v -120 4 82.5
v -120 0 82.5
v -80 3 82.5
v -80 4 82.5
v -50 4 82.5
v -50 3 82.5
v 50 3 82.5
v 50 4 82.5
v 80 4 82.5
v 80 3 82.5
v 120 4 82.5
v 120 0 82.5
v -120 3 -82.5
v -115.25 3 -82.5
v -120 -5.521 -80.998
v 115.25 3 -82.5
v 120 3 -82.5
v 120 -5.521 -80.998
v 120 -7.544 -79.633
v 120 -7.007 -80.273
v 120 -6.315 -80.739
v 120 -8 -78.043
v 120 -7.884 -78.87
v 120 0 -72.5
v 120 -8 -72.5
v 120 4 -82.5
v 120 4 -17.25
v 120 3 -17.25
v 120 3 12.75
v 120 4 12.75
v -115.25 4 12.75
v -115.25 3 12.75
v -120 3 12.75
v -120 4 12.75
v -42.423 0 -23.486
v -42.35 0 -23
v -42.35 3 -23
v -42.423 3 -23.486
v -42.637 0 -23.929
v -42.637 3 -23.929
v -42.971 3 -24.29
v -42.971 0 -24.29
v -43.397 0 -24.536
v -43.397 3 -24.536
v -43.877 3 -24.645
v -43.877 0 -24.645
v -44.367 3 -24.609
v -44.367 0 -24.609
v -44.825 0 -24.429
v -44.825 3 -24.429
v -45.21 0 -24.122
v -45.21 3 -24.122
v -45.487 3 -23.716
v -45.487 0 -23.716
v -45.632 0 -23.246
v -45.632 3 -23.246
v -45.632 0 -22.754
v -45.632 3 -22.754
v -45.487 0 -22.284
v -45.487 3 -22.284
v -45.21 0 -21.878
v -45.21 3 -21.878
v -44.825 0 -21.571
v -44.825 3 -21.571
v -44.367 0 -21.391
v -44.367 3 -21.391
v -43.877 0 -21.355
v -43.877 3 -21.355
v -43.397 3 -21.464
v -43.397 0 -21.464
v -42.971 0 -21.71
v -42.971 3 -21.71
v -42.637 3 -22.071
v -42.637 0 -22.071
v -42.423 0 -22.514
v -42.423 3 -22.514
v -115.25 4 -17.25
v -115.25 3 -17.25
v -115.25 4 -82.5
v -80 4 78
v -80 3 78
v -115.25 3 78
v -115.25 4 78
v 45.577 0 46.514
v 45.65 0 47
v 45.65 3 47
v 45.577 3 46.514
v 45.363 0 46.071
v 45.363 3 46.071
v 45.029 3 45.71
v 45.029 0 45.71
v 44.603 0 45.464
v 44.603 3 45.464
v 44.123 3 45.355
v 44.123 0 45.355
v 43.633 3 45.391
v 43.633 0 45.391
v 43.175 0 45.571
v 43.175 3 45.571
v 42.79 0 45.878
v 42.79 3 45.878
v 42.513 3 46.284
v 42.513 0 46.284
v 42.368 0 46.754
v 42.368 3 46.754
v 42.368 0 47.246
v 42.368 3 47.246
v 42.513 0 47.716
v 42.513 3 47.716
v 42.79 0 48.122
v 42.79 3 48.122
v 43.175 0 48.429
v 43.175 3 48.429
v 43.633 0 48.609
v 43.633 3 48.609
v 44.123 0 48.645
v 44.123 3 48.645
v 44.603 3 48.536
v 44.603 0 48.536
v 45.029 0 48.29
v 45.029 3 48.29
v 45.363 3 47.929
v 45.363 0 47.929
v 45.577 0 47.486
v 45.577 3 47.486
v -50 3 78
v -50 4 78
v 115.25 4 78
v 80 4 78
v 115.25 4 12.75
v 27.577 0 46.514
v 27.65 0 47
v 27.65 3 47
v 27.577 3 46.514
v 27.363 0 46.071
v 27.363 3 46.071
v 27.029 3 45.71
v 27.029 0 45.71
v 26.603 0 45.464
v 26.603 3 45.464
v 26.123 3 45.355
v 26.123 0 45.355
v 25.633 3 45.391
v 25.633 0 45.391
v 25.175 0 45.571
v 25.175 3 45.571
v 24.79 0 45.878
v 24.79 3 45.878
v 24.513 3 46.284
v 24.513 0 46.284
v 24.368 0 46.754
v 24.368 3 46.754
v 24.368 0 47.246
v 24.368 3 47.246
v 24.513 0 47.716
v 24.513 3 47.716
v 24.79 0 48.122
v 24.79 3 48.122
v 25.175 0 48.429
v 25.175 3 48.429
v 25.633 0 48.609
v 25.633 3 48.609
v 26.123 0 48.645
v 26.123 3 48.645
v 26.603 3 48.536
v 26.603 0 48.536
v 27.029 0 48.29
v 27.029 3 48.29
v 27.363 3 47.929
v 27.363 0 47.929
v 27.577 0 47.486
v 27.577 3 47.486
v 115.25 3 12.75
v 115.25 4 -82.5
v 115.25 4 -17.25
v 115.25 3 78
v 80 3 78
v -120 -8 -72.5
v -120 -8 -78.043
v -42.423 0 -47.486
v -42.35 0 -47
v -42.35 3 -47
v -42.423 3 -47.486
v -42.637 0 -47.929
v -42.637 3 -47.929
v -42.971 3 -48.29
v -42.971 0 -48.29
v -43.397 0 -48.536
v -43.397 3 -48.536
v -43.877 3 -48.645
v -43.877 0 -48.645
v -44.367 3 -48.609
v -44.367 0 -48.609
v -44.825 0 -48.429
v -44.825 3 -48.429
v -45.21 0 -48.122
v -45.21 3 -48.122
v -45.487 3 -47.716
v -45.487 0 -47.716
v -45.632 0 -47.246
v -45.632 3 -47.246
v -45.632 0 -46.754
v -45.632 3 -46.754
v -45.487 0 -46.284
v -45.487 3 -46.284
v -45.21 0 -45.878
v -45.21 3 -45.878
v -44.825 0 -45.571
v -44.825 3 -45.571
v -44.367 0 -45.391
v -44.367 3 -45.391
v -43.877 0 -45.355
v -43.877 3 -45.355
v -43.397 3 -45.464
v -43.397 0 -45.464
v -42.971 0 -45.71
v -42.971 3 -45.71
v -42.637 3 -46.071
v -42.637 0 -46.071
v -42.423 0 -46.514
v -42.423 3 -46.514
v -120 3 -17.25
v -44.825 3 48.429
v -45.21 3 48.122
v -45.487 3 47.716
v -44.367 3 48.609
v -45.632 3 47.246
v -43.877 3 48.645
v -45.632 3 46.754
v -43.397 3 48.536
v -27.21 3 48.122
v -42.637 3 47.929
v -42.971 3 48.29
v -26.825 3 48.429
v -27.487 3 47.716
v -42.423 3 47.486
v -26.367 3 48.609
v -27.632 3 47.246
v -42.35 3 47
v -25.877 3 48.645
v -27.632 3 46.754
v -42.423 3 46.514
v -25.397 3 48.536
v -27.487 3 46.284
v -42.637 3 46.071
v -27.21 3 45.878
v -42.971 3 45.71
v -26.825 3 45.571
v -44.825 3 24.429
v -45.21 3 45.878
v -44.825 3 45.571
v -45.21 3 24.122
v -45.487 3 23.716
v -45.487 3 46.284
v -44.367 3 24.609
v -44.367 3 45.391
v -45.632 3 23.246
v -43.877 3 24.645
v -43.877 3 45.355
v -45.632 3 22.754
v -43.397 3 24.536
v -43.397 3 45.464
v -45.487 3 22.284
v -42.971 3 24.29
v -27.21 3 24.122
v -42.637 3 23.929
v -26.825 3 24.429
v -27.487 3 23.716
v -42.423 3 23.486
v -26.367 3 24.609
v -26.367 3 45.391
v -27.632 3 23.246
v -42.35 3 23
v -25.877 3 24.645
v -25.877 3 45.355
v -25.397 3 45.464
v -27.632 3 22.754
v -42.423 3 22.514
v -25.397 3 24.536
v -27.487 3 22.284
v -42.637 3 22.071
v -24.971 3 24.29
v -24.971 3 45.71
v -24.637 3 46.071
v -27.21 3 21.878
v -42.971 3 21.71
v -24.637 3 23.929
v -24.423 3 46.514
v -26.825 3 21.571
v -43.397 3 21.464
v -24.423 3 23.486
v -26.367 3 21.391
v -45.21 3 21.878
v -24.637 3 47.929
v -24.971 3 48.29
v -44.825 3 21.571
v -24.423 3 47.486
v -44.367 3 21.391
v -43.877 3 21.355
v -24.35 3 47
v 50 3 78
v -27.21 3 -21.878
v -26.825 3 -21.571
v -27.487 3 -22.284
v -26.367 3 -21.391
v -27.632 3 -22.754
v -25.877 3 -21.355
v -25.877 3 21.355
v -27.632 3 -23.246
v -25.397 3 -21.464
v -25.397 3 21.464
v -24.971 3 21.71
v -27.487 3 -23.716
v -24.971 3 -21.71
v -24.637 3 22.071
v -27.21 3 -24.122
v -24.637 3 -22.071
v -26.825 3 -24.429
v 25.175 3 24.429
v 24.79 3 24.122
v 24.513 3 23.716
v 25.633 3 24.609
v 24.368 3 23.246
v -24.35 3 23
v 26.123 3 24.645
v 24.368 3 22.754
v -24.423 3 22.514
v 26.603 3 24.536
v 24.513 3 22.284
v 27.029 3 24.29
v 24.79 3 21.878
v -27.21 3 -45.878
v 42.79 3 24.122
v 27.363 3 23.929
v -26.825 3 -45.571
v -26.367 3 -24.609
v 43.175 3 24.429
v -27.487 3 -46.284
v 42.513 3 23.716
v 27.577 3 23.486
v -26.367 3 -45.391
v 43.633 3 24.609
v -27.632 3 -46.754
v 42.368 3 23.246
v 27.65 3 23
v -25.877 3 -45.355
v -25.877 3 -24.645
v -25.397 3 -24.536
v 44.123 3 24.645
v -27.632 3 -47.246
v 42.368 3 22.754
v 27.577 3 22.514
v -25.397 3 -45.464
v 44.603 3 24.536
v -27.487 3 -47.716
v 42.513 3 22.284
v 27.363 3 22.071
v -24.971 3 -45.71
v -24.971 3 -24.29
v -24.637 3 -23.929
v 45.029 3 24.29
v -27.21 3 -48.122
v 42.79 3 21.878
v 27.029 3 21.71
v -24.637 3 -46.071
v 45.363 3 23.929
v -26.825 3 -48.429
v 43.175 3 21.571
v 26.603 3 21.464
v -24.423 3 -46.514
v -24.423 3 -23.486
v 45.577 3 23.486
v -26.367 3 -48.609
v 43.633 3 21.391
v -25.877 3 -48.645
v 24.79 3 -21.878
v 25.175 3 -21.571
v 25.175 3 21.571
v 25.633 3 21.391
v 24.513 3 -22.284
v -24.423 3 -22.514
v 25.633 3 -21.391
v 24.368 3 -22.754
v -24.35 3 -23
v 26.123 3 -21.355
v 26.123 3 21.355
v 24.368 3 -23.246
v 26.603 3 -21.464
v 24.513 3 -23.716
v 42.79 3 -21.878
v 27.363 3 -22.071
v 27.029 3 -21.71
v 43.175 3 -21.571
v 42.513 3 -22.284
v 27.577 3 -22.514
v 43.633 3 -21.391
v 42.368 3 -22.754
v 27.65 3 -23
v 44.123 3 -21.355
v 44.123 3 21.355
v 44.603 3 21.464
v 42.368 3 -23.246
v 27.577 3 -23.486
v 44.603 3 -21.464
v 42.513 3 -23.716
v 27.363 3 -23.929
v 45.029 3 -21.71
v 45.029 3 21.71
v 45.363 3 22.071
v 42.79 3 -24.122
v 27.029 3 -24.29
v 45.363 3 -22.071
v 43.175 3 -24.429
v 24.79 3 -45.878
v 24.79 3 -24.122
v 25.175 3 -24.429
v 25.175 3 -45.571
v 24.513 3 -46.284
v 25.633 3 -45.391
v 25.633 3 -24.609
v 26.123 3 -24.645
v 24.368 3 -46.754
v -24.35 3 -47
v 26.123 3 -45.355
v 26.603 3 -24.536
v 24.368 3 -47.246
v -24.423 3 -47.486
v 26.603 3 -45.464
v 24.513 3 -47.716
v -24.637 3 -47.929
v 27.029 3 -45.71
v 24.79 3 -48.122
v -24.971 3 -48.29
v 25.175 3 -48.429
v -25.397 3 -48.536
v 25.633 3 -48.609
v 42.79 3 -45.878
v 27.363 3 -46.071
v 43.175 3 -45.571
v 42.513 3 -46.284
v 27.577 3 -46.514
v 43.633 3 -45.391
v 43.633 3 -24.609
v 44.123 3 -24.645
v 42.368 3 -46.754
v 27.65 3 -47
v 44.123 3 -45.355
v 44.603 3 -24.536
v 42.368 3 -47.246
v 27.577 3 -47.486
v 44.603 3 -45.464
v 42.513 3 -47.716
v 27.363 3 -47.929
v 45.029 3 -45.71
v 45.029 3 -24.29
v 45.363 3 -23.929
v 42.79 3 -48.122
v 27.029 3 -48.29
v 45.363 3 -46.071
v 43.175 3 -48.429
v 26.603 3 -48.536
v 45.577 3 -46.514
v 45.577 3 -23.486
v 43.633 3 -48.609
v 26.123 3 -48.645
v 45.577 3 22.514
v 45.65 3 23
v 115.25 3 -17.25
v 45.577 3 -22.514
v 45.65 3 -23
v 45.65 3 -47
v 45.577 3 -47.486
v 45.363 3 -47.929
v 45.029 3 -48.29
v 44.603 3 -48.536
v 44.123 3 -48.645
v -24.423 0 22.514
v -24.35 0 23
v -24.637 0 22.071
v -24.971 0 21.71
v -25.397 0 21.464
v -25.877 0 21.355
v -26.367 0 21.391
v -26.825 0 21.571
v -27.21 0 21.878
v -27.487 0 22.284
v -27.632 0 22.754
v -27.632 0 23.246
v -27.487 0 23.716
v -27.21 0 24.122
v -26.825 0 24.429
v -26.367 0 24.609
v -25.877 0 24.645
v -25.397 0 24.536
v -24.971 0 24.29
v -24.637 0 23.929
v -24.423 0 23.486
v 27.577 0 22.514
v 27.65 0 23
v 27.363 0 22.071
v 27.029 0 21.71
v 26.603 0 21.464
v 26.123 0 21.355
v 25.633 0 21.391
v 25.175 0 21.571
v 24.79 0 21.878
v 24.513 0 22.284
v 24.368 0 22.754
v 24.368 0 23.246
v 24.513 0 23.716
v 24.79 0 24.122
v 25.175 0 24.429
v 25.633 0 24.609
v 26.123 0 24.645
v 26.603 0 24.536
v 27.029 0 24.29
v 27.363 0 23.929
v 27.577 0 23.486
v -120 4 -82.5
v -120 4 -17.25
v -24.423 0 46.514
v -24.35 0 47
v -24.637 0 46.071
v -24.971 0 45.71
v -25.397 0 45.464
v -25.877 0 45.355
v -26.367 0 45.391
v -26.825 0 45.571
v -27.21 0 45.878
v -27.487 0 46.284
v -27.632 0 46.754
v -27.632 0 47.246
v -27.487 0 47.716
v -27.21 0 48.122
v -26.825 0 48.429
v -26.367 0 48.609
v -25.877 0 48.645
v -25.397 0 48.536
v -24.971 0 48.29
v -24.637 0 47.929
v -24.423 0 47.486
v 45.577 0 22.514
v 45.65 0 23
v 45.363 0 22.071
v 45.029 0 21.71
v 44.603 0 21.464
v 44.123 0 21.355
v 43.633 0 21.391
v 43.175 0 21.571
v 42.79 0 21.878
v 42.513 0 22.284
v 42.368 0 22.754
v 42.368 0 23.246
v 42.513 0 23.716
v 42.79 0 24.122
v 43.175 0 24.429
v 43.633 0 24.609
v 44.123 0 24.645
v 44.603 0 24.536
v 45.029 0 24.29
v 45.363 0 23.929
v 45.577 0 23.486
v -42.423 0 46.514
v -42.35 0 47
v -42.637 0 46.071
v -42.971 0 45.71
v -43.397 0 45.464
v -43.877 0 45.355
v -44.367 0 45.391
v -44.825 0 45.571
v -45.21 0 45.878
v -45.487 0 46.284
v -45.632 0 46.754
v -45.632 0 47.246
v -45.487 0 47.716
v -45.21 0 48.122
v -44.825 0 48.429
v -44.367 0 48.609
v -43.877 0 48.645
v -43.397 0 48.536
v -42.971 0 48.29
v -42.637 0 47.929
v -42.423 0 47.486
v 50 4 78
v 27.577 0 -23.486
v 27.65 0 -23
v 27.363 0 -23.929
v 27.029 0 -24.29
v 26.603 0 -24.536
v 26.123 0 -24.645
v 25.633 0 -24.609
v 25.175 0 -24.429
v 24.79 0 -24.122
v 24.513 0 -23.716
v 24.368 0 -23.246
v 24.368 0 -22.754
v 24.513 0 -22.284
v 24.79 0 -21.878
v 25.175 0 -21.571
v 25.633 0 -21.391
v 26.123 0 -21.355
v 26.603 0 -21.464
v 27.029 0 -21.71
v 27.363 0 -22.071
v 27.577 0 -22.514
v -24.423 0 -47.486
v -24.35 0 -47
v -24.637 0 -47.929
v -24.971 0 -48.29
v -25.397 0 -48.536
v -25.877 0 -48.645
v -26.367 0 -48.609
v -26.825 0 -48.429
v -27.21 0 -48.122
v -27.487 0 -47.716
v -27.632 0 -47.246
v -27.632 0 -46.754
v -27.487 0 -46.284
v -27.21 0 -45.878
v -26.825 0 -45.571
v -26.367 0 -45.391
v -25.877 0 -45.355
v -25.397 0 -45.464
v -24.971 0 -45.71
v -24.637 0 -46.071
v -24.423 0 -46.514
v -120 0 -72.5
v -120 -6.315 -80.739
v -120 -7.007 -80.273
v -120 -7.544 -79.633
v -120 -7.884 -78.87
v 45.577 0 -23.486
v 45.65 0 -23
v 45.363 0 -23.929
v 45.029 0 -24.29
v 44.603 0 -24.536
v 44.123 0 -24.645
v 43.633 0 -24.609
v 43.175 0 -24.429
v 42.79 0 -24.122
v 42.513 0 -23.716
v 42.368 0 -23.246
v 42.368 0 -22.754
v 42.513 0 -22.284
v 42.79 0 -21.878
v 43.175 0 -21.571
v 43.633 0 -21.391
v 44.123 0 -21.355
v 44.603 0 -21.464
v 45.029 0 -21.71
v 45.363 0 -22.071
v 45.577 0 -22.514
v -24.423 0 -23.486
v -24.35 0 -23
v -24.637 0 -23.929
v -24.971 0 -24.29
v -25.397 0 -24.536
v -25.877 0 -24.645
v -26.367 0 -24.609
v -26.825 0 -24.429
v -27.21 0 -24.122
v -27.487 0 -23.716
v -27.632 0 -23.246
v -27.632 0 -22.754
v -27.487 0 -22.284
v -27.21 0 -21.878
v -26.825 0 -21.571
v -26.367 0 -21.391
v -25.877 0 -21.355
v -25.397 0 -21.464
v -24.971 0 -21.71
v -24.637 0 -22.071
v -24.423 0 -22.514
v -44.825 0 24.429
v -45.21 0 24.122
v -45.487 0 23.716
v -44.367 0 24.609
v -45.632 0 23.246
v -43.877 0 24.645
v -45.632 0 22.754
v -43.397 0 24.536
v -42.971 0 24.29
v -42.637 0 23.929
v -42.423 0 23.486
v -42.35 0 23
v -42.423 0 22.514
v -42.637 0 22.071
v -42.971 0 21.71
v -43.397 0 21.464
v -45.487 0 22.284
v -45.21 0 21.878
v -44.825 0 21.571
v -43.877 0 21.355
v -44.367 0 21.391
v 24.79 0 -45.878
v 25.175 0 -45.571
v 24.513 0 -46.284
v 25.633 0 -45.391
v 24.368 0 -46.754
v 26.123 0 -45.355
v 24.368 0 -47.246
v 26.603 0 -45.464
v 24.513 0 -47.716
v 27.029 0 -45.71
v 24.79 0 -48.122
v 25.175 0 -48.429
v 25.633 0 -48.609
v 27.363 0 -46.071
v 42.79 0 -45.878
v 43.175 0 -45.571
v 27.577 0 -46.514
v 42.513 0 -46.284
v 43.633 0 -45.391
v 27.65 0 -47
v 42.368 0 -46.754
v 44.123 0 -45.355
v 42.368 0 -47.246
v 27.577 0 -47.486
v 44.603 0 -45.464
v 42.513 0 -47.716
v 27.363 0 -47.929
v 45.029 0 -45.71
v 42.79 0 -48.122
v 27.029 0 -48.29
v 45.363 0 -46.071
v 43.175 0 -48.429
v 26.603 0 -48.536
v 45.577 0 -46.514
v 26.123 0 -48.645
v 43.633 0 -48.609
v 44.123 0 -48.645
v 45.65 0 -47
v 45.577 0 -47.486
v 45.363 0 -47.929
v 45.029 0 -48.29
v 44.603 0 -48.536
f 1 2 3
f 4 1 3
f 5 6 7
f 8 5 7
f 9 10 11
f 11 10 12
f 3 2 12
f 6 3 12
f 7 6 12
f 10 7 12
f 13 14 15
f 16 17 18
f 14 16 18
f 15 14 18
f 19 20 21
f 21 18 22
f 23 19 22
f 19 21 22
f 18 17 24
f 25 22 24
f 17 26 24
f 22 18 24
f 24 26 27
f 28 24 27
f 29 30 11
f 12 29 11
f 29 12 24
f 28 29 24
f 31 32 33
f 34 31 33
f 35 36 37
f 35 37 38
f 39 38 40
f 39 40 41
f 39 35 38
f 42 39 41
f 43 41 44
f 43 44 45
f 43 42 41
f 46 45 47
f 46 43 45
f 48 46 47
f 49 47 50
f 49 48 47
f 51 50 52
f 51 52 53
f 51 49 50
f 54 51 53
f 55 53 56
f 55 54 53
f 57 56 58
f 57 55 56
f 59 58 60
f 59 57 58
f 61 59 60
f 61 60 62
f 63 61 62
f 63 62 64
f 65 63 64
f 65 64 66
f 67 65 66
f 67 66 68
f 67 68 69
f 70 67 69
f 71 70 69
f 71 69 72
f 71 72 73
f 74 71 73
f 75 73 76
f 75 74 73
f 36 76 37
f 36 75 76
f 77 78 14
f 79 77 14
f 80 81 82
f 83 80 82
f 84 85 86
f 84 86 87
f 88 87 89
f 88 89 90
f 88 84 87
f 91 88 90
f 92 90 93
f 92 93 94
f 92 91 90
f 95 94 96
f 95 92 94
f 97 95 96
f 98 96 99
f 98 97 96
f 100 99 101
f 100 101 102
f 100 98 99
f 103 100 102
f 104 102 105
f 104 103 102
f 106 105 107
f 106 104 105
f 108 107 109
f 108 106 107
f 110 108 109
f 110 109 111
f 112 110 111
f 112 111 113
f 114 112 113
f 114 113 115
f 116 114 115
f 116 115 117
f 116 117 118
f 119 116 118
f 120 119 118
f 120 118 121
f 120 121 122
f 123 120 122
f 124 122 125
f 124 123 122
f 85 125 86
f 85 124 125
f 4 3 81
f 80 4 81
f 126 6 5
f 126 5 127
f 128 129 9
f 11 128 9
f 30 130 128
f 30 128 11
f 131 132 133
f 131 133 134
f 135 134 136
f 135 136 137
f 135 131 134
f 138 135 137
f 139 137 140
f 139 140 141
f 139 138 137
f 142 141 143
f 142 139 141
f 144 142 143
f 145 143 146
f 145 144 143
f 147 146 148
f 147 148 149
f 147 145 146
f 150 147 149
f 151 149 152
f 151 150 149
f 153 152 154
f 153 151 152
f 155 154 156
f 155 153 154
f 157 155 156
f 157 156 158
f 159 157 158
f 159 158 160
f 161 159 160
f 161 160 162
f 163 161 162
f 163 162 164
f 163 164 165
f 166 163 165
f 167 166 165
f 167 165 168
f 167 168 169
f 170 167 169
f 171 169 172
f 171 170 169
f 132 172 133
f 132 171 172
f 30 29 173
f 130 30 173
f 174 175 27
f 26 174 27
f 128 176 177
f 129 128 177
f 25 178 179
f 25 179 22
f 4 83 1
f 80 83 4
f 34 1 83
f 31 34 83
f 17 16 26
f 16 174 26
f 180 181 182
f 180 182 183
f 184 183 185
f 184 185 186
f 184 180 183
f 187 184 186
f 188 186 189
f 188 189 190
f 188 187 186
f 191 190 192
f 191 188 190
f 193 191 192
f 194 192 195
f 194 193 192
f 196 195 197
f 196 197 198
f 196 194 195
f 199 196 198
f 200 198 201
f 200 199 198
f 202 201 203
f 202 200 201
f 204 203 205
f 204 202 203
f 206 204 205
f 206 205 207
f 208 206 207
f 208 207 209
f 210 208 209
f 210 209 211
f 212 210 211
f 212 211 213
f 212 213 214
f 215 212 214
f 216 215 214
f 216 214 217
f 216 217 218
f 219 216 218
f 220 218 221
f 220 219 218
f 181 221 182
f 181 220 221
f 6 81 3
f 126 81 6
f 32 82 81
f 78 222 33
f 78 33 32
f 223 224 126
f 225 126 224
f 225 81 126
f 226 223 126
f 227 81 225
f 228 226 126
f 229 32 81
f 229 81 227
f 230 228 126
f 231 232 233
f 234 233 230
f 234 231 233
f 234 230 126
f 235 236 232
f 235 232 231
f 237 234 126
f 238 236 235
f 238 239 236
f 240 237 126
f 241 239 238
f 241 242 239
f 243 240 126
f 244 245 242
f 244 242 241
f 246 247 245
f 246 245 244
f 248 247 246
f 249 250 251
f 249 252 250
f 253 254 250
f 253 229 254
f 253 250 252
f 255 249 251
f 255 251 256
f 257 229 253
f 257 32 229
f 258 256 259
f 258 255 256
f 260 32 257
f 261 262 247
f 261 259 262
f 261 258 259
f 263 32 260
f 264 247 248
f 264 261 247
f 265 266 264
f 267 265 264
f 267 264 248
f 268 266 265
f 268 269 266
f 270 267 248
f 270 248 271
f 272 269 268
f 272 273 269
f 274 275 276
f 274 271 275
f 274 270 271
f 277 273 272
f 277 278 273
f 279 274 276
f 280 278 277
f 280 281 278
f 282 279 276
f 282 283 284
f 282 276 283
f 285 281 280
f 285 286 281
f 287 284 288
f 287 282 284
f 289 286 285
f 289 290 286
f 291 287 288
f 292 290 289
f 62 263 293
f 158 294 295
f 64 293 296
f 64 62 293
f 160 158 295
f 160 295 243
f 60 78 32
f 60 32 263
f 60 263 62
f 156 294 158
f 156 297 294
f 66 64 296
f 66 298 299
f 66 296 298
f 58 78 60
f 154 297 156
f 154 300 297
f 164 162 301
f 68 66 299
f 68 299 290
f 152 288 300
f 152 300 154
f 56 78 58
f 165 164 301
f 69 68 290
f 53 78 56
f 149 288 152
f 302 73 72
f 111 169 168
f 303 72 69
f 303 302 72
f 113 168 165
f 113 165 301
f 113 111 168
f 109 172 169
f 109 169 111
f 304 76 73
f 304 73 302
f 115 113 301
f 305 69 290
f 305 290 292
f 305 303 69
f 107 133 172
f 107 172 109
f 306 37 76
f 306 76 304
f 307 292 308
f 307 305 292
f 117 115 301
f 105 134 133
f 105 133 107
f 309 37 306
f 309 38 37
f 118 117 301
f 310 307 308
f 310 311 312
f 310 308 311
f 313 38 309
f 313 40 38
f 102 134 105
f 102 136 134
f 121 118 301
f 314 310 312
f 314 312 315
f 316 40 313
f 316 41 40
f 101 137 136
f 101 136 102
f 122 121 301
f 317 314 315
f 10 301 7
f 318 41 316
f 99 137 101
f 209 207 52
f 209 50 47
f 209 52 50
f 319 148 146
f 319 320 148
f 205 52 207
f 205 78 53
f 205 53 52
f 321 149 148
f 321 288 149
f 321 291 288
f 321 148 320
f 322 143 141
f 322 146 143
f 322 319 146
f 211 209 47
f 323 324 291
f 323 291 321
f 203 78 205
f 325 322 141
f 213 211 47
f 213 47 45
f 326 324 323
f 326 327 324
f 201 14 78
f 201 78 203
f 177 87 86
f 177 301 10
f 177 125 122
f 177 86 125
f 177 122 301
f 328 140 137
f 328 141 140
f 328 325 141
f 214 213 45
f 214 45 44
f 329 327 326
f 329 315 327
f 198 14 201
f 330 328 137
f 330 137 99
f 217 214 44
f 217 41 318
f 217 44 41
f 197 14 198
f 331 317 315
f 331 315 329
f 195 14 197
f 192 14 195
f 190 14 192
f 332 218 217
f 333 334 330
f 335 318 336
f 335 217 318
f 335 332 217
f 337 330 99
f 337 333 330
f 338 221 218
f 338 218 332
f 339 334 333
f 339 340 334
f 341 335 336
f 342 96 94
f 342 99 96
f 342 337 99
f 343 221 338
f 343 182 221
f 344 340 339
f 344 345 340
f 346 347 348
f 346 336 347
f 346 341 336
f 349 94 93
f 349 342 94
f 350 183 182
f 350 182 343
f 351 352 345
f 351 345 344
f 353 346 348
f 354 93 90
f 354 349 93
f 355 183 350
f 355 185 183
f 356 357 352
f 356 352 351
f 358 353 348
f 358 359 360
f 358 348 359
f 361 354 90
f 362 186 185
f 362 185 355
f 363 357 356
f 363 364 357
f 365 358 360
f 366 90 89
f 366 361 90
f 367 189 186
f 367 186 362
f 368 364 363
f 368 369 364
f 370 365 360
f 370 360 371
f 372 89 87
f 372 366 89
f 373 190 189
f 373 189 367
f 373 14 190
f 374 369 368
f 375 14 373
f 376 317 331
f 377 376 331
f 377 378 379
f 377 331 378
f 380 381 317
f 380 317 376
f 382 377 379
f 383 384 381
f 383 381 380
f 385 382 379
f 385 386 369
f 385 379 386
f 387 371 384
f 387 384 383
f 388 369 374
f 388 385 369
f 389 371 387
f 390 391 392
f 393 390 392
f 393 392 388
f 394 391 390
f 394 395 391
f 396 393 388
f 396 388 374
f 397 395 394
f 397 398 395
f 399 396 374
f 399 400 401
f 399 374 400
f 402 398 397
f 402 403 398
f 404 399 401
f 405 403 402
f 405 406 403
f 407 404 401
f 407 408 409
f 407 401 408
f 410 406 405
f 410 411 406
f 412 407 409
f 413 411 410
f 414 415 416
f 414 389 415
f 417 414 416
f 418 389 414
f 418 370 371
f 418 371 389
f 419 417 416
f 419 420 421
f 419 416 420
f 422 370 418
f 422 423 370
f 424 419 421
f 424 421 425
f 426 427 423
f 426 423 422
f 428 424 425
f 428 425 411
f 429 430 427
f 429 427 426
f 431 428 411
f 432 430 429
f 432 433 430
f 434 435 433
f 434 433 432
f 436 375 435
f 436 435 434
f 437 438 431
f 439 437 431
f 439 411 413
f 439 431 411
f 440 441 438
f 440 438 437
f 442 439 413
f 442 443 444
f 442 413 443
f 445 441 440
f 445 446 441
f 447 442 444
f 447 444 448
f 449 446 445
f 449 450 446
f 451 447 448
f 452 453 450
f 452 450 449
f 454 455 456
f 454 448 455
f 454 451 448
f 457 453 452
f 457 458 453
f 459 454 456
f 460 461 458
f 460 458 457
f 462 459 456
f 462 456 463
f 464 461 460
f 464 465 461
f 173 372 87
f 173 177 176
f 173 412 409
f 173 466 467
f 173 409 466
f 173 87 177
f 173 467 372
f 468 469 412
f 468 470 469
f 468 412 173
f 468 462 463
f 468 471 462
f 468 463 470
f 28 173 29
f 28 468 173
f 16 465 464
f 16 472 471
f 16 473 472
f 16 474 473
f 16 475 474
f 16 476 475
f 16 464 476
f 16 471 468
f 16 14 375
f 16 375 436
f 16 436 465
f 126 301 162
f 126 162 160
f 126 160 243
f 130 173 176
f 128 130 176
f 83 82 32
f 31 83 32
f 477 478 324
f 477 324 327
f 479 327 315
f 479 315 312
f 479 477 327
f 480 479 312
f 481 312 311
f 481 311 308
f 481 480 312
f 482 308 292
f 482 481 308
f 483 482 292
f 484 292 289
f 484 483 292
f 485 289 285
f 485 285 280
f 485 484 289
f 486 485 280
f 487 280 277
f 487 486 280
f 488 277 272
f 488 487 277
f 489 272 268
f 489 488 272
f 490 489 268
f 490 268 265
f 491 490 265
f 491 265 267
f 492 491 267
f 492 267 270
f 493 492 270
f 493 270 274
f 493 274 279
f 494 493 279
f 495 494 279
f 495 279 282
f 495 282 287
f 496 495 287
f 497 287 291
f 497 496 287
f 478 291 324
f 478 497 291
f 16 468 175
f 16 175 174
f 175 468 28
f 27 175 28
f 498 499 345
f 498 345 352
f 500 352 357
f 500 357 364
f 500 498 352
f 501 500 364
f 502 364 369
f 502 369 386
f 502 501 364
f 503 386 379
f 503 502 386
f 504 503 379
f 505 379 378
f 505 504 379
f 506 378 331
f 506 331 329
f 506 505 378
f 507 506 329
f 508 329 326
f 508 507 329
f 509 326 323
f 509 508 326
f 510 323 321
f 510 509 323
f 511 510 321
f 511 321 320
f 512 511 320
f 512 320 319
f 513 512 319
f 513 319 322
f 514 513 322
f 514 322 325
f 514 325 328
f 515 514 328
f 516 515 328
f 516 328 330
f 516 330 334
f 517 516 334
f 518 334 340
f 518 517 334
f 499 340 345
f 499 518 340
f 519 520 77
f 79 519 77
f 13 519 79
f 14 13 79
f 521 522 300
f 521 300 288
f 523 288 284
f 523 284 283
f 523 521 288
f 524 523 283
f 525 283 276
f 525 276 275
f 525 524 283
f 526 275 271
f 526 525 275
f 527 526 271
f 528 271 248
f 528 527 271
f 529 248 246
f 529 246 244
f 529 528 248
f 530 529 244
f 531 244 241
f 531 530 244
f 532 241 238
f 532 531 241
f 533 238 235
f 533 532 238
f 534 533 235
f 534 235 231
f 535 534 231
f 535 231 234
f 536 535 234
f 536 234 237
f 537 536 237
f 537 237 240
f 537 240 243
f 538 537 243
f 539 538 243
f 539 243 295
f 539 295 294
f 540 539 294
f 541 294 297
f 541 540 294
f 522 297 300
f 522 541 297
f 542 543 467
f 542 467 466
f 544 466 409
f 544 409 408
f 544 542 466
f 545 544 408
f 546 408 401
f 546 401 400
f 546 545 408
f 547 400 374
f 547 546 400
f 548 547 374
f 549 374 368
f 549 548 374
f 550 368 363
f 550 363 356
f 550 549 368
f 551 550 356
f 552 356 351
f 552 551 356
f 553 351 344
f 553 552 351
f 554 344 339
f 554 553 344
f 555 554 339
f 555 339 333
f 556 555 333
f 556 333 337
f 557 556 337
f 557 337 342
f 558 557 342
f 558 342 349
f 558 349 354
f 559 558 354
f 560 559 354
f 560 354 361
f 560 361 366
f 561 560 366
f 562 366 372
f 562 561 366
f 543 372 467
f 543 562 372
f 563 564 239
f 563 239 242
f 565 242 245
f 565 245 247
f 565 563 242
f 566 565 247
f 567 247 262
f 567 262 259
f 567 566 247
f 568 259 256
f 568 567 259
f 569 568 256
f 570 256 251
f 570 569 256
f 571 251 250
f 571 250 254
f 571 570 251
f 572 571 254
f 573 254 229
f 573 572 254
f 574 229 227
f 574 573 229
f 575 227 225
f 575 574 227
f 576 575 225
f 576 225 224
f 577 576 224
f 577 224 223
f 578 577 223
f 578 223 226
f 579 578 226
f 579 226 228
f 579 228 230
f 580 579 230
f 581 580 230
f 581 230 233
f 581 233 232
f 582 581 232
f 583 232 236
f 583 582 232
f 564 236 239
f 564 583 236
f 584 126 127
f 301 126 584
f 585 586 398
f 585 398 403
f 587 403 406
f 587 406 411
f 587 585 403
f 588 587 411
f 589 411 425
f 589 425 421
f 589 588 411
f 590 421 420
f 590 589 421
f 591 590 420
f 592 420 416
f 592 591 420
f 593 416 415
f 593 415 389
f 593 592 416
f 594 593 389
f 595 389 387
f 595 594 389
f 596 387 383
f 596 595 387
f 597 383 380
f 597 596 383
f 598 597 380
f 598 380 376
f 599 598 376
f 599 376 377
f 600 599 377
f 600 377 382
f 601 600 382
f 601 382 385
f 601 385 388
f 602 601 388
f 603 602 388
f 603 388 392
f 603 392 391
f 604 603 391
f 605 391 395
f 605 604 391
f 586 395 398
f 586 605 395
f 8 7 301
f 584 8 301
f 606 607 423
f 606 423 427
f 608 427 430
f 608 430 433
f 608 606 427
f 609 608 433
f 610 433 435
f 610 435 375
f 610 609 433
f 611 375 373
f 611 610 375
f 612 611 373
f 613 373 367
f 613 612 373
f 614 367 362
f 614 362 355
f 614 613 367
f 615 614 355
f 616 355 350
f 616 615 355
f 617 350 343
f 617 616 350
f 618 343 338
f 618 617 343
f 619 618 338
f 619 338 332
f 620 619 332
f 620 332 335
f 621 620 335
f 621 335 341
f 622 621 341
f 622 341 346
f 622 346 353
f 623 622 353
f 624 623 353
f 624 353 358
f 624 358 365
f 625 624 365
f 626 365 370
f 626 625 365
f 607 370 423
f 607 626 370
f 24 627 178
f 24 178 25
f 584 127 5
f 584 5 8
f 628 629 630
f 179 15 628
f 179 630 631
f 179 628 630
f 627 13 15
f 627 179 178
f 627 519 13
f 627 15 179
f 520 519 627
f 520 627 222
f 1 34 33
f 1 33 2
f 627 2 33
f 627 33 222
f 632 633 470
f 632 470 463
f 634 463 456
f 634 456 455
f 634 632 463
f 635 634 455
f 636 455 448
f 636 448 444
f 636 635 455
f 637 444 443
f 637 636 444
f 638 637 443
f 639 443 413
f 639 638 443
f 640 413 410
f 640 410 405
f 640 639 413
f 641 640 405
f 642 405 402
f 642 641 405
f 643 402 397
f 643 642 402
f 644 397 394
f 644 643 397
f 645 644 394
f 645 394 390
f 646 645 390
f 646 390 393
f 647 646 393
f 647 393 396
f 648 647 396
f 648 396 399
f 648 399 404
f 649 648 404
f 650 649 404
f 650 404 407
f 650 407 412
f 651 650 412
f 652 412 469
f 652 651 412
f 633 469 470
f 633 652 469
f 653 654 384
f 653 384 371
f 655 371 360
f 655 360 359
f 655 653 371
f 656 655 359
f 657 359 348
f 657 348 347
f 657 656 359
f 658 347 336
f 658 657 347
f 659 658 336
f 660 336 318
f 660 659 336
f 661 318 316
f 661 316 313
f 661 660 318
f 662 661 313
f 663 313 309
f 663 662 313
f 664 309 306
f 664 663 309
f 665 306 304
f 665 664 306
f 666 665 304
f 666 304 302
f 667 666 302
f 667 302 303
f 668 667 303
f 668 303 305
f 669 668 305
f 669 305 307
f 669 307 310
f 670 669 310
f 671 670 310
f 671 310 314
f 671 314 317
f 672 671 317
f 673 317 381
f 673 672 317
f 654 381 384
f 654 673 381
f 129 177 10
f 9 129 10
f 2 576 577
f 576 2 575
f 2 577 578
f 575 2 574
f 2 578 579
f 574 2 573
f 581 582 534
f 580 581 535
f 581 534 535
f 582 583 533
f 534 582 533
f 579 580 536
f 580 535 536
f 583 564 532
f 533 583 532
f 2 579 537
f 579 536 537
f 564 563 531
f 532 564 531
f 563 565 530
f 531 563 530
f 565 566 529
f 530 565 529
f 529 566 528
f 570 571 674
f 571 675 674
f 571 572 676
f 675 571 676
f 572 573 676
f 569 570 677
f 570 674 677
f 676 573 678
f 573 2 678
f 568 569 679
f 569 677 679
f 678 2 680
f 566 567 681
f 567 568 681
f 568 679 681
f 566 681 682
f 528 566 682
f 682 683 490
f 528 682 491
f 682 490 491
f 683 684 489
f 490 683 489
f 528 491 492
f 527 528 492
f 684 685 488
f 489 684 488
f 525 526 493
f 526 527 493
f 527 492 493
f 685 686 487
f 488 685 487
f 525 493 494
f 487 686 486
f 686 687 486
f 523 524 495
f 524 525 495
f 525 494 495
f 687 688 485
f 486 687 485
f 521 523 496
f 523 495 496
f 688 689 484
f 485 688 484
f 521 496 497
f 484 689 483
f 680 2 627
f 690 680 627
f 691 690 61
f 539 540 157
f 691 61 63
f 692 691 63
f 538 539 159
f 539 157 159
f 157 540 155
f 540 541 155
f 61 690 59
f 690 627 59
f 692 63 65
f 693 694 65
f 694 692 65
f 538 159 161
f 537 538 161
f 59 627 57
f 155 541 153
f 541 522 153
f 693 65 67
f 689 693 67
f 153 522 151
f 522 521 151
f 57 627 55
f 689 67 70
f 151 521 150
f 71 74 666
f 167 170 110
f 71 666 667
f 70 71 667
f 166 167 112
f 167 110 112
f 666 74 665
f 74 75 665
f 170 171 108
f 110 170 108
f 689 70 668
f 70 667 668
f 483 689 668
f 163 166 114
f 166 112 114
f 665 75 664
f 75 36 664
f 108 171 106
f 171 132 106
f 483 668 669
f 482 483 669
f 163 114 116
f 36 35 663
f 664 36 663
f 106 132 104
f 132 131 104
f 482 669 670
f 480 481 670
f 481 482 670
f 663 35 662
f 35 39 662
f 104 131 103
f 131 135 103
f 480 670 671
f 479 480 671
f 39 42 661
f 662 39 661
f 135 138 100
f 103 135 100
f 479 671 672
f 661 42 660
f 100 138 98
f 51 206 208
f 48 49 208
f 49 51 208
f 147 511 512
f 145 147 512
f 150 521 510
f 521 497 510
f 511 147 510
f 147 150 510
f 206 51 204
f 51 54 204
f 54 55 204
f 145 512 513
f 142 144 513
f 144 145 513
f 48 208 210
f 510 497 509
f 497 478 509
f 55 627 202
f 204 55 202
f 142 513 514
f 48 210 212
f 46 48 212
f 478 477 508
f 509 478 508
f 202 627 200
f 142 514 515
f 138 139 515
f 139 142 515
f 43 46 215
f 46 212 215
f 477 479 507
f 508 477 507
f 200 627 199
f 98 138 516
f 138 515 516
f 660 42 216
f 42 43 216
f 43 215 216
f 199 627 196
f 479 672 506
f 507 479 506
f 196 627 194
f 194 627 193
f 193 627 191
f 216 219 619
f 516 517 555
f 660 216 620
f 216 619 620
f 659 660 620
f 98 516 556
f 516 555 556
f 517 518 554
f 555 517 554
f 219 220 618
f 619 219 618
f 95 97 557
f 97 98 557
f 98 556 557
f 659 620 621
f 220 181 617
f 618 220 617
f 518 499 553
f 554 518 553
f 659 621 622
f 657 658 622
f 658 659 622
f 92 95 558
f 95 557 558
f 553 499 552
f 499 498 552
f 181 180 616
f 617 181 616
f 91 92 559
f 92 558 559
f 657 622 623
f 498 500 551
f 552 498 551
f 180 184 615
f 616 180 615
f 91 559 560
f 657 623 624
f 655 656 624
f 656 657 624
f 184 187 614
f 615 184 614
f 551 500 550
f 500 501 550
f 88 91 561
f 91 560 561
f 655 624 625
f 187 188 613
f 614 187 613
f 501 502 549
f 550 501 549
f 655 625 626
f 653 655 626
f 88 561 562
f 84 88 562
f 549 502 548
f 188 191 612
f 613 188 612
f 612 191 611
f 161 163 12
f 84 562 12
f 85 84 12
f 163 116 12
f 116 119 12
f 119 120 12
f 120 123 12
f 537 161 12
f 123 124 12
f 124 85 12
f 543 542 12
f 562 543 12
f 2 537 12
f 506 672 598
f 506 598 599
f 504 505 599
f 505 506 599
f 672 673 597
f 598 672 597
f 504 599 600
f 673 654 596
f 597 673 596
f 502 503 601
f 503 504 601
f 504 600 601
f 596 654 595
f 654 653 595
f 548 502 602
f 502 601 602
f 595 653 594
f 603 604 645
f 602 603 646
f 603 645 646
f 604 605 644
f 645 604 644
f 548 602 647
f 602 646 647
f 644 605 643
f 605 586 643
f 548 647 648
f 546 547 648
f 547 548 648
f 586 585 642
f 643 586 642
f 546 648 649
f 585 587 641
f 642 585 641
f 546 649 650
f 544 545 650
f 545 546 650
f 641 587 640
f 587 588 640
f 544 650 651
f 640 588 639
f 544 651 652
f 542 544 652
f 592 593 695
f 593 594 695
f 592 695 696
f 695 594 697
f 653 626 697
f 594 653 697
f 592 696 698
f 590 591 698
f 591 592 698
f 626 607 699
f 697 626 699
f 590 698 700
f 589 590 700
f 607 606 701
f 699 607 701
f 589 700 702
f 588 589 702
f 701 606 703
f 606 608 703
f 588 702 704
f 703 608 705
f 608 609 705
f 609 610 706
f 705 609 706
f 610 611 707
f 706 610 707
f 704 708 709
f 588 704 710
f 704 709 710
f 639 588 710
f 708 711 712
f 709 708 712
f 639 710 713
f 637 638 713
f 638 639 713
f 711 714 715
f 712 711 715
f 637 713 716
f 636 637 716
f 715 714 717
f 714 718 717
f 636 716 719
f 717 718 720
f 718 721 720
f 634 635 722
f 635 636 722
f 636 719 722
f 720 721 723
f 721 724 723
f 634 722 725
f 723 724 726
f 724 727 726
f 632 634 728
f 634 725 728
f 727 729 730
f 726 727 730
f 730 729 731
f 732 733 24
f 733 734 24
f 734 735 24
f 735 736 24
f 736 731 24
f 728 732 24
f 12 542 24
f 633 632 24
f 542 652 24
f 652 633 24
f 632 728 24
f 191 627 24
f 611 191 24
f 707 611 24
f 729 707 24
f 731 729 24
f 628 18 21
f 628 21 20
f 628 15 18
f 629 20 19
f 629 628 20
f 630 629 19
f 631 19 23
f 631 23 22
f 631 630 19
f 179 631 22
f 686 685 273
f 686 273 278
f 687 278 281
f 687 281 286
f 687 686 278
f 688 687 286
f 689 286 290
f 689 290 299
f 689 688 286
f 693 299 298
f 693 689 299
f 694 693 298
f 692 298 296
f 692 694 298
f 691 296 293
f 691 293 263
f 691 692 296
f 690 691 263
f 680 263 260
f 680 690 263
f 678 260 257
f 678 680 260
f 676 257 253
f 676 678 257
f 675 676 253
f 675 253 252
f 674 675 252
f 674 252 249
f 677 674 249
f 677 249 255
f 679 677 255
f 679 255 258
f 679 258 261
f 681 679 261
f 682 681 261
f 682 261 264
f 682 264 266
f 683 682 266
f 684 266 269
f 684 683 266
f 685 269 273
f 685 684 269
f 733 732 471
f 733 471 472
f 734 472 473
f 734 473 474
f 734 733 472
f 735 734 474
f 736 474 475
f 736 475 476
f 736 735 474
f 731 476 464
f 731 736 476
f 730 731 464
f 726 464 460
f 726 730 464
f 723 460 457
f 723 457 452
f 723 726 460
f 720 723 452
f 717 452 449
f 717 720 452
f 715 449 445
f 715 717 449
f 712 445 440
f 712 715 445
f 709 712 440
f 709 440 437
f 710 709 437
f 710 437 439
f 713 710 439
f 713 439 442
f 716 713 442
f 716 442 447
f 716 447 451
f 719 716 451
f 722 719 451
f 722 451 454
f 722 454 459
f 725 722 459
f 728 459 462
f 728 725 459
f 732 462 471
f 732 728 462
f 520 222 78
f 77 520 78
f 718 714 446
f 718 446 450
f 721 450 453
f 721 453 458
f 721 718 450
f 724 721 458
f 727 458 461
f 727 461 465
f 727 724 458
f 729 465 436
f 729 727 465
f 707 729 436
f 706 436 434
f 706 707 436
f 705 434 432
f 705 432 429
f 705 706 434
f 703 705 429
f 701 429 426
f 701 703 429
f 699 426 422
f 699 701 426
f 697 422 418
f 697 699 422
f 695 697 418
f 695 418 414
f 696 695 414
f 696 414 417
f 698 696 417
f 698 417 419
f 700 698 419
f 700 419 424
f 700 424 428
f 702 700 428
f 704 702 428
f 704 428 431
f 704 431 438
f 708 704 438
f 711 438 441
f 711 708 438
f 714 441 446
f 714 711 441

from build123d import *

# Parameters (mm, degrees)
BOSS_EXTRUDE3_DEPTH   = 4
SKETCH2_W             = 100
SKETCH2_H             = 4.5
BOSS_EXTRUDE3_2_DEPTH = 4
BOSS_EXTRUDE3_3_DEPTH = 4
SKETCH2_W_2           = 4.75
SKETCH2_H_2           = 65.25
BOSS_EXTRUDE3_4_DEPTH = 4
BOSS_EXTRUDE3_5_DEPTH = 4
SKETCH2_5_R           = 1.65
BOSS_EXTRUDE4_DEPTH   = 3
SKETCH3_W             = 240
SKETCH3_H             = 10
BOSS_EXTRUDE5_DEPTH   = 8
CUT_EXTRUDE1_DEPTH    = 254.909924973
FILLET2_R             = 3


with BuildPart() as part:
    # Sketch2 → Boss-Extrude3 (new body)
    with BuildSketch(Plane(origin=(0, 0, 0), x_dir=(1, 0, 0), z_dir=(0, 1, 0))):
        Polygon((115.25, -78), (80, -78), (80, -82.5), (120, -82.5), (120, -12.75), (115.25, -12.75), align=None)
    extrude(amount=BOSS_EXTRUDE3_DEPTH)



with BuildPart() as body_2:
    # Sketch2 → Boss-Extrude3 2 (new body)
    with BuildSketch(Plane(origin=(0, 0, 0), x_dir=(1, 0, 0), z_dir=(0, 1, 0))):
        with Locations((0, -80.25)):
            Rectangle(SKETCH2_W, SKETCH2_H)
    extrude(amount=BOSS_EXTRUDE3_2_DEPTH)


with BuildPart() as body_3:
    # Sketch2 → Boss-Extrude3 3 (new body)
    with BuildSketch(Plane(origin=(0, 0, 0), x_dir=(1, 0, 0), z_dir=(0, 1, 0))):
        Polygon((-80, -82.5), (-80, -78), (-115.25, -78), (-115.25, -12.75), (-120, -12.75), (-120, -82.5), align=None)
    extrude(amount=BOSS_EXTRUDE3_3_DEPTH)


with BuildPart() as body_4:
    # Sketch2 → Boss-Extrude3 4 (new body)
    with BuildSketch(Plane(origin=(0, 0, 0), x_dir=(1, 0, 0), z_dir=(0, 1, 0))):
        with Locations((117.625, 49.875)):
            Rectangle(SKETCH2_W_2, SKETCH2_H_2)
    extrude(amount=BOSS_EXTRUDE3_4_DEPTH)


with BuildPart() as body_5:
    # Sketch2 → Boss-Extrude3 5 (new body)
    with BuildSketch(Plane(origin=(0, 0, 0), x_dir=(1, 0, 0), z_dir=(0, 1, 0))):
        with Locations((-117.625, 49.875)):
            Rectangle(SKETCH2_W_2, SKETCH2_H_2)
    extrude(amount=BOSS_EXTRUDE3_5_DEPTH)


with BuildPart() as part_1:
    add(part.part)

    add(body_2.part)  # Boss-Extrude4 merges body 2

    add(body_3.part)  # Boss-Extrude4 merges body 3

    add(body_4.part)  # Boss-Extrude4 merges body 4

    add(body_5.part)  # Boss-Extrude4 merges body 5
    # Sketch2<5> → Boss-Extrude4 (add)
    with BuildSketch(Plane(origin=(0, 0, 0), x_dir=(1, 0, 0), z_dir=(0, 1, 0))):
        Polygon((80, -82.5), (80, -78), (115.25, -78), (115.25, -12.75), (120, -12.75), (120, 17.25), (115.25, 17.25), (115.25, 82.5), (-115.25, 82.5), (-115.25, 17.25), (-120, 17.25), (-120, -12.75), (-115.25, -12.75), (-115.25, -78), (-80, -78), (-80, -82.5), (-50, -82.5), (-50, -78), (50, -78), (50, -82.5), align=None)
        with Locations((44, 47)):
            Circle(SKETCH2_5_R, mode=Mode.SUBTRACT)
        with Locations((-44, -47)):
            Circle(SKETCH2_5_R, mode=Mode.SUBTRACT)
        with Locations((-26, -47)):
            Circle(SKETCH2_5_R, mode=Mode.SUBTRACT)
        with Locations((-44, -23)):
            Circle(SKETCH2_5_R, mode=Mode.SUBTRACT)
        with Locations((-26, -23)):
            Circle(SKETCH2_5_R, mode=Mode.SUBTRACT)
        with Locations((26, -47)):
            Circle(SKETCH2_5_R, mode=Mode.SUBTRACT)
        with Locations((44, -47)):
            Circle(SKETCH2_5_R, mode=Mode.SUBTRACT)
        with Locations((26, -23)):
            Circle(SKETCH2_5_R, mode=Mode.SUBTRACT)
        with Locations((44, -23)):
            Circle(SKETCH2_5_R, mode=Mode.SUBTRACT)
        with Locations((-44, 23)):
            Circle(SKETCH2_5_R, mode=Mode.SUBTRACT)
        with Locations((-26, 23)):
            Circle(SKETCH2_5_R, mode=Mode.SUBTRACT)
        with Locations((-44, 47)):
            Circle(SKETCH2_5_R, mode=Mode.SUBTRACT)
        with Locations((-26, 47)):
            Circle(SKETCH2_5_R, mode=Mode.SUBTRACT)
        with Locations((26, 23)):
            Circle(SKETCH2_5_R, mode=Mode.SUBTRACT)
        with Locations((44, 23)):
            Circle(SKETCH2_5_R, mode=Mode.SUBTRACT)
        with Locations((26, 47)):
            Circle(SKETCH2_5_R, mode=Mode.SUBTRACT)
    extrude(amount=BOSS_EXTRUDE4_DEPTH)

    # Sketch3 → Boss-Extrude5 (add)
    with BuildSketch(Plane.XZ):
        with Locations((0, -77.5)):
            Rectangle(SKETCH3_W, SKETCH3_H)
    extrude(amount=BOSS_EXTRUDE5_DEPTH)

    # Sketch4 → Cut-Extrude1 (cut, through all)
    with BuildSketch(Plane(origin=(120, 0, 0), x_dir=(0, 0, -1), z_dir=(1, 0, 0))):
        Polygon((82.5, 3), (80.560403212, -8), (82.5, -8), align=None)
    extrude(amount=-CUT_EXTRUDE1_DEPTH, mode=Mode.SUBTRACT)

    # Fillet2
    fillet2_edges = [part_1.edges().sort_by_distance(p)[0] for p in [
        (0, -8, -80.560403212),
    ]]
    fillet(fillet2_edges, radius=FILLET2_R)


solid = part_1.part
